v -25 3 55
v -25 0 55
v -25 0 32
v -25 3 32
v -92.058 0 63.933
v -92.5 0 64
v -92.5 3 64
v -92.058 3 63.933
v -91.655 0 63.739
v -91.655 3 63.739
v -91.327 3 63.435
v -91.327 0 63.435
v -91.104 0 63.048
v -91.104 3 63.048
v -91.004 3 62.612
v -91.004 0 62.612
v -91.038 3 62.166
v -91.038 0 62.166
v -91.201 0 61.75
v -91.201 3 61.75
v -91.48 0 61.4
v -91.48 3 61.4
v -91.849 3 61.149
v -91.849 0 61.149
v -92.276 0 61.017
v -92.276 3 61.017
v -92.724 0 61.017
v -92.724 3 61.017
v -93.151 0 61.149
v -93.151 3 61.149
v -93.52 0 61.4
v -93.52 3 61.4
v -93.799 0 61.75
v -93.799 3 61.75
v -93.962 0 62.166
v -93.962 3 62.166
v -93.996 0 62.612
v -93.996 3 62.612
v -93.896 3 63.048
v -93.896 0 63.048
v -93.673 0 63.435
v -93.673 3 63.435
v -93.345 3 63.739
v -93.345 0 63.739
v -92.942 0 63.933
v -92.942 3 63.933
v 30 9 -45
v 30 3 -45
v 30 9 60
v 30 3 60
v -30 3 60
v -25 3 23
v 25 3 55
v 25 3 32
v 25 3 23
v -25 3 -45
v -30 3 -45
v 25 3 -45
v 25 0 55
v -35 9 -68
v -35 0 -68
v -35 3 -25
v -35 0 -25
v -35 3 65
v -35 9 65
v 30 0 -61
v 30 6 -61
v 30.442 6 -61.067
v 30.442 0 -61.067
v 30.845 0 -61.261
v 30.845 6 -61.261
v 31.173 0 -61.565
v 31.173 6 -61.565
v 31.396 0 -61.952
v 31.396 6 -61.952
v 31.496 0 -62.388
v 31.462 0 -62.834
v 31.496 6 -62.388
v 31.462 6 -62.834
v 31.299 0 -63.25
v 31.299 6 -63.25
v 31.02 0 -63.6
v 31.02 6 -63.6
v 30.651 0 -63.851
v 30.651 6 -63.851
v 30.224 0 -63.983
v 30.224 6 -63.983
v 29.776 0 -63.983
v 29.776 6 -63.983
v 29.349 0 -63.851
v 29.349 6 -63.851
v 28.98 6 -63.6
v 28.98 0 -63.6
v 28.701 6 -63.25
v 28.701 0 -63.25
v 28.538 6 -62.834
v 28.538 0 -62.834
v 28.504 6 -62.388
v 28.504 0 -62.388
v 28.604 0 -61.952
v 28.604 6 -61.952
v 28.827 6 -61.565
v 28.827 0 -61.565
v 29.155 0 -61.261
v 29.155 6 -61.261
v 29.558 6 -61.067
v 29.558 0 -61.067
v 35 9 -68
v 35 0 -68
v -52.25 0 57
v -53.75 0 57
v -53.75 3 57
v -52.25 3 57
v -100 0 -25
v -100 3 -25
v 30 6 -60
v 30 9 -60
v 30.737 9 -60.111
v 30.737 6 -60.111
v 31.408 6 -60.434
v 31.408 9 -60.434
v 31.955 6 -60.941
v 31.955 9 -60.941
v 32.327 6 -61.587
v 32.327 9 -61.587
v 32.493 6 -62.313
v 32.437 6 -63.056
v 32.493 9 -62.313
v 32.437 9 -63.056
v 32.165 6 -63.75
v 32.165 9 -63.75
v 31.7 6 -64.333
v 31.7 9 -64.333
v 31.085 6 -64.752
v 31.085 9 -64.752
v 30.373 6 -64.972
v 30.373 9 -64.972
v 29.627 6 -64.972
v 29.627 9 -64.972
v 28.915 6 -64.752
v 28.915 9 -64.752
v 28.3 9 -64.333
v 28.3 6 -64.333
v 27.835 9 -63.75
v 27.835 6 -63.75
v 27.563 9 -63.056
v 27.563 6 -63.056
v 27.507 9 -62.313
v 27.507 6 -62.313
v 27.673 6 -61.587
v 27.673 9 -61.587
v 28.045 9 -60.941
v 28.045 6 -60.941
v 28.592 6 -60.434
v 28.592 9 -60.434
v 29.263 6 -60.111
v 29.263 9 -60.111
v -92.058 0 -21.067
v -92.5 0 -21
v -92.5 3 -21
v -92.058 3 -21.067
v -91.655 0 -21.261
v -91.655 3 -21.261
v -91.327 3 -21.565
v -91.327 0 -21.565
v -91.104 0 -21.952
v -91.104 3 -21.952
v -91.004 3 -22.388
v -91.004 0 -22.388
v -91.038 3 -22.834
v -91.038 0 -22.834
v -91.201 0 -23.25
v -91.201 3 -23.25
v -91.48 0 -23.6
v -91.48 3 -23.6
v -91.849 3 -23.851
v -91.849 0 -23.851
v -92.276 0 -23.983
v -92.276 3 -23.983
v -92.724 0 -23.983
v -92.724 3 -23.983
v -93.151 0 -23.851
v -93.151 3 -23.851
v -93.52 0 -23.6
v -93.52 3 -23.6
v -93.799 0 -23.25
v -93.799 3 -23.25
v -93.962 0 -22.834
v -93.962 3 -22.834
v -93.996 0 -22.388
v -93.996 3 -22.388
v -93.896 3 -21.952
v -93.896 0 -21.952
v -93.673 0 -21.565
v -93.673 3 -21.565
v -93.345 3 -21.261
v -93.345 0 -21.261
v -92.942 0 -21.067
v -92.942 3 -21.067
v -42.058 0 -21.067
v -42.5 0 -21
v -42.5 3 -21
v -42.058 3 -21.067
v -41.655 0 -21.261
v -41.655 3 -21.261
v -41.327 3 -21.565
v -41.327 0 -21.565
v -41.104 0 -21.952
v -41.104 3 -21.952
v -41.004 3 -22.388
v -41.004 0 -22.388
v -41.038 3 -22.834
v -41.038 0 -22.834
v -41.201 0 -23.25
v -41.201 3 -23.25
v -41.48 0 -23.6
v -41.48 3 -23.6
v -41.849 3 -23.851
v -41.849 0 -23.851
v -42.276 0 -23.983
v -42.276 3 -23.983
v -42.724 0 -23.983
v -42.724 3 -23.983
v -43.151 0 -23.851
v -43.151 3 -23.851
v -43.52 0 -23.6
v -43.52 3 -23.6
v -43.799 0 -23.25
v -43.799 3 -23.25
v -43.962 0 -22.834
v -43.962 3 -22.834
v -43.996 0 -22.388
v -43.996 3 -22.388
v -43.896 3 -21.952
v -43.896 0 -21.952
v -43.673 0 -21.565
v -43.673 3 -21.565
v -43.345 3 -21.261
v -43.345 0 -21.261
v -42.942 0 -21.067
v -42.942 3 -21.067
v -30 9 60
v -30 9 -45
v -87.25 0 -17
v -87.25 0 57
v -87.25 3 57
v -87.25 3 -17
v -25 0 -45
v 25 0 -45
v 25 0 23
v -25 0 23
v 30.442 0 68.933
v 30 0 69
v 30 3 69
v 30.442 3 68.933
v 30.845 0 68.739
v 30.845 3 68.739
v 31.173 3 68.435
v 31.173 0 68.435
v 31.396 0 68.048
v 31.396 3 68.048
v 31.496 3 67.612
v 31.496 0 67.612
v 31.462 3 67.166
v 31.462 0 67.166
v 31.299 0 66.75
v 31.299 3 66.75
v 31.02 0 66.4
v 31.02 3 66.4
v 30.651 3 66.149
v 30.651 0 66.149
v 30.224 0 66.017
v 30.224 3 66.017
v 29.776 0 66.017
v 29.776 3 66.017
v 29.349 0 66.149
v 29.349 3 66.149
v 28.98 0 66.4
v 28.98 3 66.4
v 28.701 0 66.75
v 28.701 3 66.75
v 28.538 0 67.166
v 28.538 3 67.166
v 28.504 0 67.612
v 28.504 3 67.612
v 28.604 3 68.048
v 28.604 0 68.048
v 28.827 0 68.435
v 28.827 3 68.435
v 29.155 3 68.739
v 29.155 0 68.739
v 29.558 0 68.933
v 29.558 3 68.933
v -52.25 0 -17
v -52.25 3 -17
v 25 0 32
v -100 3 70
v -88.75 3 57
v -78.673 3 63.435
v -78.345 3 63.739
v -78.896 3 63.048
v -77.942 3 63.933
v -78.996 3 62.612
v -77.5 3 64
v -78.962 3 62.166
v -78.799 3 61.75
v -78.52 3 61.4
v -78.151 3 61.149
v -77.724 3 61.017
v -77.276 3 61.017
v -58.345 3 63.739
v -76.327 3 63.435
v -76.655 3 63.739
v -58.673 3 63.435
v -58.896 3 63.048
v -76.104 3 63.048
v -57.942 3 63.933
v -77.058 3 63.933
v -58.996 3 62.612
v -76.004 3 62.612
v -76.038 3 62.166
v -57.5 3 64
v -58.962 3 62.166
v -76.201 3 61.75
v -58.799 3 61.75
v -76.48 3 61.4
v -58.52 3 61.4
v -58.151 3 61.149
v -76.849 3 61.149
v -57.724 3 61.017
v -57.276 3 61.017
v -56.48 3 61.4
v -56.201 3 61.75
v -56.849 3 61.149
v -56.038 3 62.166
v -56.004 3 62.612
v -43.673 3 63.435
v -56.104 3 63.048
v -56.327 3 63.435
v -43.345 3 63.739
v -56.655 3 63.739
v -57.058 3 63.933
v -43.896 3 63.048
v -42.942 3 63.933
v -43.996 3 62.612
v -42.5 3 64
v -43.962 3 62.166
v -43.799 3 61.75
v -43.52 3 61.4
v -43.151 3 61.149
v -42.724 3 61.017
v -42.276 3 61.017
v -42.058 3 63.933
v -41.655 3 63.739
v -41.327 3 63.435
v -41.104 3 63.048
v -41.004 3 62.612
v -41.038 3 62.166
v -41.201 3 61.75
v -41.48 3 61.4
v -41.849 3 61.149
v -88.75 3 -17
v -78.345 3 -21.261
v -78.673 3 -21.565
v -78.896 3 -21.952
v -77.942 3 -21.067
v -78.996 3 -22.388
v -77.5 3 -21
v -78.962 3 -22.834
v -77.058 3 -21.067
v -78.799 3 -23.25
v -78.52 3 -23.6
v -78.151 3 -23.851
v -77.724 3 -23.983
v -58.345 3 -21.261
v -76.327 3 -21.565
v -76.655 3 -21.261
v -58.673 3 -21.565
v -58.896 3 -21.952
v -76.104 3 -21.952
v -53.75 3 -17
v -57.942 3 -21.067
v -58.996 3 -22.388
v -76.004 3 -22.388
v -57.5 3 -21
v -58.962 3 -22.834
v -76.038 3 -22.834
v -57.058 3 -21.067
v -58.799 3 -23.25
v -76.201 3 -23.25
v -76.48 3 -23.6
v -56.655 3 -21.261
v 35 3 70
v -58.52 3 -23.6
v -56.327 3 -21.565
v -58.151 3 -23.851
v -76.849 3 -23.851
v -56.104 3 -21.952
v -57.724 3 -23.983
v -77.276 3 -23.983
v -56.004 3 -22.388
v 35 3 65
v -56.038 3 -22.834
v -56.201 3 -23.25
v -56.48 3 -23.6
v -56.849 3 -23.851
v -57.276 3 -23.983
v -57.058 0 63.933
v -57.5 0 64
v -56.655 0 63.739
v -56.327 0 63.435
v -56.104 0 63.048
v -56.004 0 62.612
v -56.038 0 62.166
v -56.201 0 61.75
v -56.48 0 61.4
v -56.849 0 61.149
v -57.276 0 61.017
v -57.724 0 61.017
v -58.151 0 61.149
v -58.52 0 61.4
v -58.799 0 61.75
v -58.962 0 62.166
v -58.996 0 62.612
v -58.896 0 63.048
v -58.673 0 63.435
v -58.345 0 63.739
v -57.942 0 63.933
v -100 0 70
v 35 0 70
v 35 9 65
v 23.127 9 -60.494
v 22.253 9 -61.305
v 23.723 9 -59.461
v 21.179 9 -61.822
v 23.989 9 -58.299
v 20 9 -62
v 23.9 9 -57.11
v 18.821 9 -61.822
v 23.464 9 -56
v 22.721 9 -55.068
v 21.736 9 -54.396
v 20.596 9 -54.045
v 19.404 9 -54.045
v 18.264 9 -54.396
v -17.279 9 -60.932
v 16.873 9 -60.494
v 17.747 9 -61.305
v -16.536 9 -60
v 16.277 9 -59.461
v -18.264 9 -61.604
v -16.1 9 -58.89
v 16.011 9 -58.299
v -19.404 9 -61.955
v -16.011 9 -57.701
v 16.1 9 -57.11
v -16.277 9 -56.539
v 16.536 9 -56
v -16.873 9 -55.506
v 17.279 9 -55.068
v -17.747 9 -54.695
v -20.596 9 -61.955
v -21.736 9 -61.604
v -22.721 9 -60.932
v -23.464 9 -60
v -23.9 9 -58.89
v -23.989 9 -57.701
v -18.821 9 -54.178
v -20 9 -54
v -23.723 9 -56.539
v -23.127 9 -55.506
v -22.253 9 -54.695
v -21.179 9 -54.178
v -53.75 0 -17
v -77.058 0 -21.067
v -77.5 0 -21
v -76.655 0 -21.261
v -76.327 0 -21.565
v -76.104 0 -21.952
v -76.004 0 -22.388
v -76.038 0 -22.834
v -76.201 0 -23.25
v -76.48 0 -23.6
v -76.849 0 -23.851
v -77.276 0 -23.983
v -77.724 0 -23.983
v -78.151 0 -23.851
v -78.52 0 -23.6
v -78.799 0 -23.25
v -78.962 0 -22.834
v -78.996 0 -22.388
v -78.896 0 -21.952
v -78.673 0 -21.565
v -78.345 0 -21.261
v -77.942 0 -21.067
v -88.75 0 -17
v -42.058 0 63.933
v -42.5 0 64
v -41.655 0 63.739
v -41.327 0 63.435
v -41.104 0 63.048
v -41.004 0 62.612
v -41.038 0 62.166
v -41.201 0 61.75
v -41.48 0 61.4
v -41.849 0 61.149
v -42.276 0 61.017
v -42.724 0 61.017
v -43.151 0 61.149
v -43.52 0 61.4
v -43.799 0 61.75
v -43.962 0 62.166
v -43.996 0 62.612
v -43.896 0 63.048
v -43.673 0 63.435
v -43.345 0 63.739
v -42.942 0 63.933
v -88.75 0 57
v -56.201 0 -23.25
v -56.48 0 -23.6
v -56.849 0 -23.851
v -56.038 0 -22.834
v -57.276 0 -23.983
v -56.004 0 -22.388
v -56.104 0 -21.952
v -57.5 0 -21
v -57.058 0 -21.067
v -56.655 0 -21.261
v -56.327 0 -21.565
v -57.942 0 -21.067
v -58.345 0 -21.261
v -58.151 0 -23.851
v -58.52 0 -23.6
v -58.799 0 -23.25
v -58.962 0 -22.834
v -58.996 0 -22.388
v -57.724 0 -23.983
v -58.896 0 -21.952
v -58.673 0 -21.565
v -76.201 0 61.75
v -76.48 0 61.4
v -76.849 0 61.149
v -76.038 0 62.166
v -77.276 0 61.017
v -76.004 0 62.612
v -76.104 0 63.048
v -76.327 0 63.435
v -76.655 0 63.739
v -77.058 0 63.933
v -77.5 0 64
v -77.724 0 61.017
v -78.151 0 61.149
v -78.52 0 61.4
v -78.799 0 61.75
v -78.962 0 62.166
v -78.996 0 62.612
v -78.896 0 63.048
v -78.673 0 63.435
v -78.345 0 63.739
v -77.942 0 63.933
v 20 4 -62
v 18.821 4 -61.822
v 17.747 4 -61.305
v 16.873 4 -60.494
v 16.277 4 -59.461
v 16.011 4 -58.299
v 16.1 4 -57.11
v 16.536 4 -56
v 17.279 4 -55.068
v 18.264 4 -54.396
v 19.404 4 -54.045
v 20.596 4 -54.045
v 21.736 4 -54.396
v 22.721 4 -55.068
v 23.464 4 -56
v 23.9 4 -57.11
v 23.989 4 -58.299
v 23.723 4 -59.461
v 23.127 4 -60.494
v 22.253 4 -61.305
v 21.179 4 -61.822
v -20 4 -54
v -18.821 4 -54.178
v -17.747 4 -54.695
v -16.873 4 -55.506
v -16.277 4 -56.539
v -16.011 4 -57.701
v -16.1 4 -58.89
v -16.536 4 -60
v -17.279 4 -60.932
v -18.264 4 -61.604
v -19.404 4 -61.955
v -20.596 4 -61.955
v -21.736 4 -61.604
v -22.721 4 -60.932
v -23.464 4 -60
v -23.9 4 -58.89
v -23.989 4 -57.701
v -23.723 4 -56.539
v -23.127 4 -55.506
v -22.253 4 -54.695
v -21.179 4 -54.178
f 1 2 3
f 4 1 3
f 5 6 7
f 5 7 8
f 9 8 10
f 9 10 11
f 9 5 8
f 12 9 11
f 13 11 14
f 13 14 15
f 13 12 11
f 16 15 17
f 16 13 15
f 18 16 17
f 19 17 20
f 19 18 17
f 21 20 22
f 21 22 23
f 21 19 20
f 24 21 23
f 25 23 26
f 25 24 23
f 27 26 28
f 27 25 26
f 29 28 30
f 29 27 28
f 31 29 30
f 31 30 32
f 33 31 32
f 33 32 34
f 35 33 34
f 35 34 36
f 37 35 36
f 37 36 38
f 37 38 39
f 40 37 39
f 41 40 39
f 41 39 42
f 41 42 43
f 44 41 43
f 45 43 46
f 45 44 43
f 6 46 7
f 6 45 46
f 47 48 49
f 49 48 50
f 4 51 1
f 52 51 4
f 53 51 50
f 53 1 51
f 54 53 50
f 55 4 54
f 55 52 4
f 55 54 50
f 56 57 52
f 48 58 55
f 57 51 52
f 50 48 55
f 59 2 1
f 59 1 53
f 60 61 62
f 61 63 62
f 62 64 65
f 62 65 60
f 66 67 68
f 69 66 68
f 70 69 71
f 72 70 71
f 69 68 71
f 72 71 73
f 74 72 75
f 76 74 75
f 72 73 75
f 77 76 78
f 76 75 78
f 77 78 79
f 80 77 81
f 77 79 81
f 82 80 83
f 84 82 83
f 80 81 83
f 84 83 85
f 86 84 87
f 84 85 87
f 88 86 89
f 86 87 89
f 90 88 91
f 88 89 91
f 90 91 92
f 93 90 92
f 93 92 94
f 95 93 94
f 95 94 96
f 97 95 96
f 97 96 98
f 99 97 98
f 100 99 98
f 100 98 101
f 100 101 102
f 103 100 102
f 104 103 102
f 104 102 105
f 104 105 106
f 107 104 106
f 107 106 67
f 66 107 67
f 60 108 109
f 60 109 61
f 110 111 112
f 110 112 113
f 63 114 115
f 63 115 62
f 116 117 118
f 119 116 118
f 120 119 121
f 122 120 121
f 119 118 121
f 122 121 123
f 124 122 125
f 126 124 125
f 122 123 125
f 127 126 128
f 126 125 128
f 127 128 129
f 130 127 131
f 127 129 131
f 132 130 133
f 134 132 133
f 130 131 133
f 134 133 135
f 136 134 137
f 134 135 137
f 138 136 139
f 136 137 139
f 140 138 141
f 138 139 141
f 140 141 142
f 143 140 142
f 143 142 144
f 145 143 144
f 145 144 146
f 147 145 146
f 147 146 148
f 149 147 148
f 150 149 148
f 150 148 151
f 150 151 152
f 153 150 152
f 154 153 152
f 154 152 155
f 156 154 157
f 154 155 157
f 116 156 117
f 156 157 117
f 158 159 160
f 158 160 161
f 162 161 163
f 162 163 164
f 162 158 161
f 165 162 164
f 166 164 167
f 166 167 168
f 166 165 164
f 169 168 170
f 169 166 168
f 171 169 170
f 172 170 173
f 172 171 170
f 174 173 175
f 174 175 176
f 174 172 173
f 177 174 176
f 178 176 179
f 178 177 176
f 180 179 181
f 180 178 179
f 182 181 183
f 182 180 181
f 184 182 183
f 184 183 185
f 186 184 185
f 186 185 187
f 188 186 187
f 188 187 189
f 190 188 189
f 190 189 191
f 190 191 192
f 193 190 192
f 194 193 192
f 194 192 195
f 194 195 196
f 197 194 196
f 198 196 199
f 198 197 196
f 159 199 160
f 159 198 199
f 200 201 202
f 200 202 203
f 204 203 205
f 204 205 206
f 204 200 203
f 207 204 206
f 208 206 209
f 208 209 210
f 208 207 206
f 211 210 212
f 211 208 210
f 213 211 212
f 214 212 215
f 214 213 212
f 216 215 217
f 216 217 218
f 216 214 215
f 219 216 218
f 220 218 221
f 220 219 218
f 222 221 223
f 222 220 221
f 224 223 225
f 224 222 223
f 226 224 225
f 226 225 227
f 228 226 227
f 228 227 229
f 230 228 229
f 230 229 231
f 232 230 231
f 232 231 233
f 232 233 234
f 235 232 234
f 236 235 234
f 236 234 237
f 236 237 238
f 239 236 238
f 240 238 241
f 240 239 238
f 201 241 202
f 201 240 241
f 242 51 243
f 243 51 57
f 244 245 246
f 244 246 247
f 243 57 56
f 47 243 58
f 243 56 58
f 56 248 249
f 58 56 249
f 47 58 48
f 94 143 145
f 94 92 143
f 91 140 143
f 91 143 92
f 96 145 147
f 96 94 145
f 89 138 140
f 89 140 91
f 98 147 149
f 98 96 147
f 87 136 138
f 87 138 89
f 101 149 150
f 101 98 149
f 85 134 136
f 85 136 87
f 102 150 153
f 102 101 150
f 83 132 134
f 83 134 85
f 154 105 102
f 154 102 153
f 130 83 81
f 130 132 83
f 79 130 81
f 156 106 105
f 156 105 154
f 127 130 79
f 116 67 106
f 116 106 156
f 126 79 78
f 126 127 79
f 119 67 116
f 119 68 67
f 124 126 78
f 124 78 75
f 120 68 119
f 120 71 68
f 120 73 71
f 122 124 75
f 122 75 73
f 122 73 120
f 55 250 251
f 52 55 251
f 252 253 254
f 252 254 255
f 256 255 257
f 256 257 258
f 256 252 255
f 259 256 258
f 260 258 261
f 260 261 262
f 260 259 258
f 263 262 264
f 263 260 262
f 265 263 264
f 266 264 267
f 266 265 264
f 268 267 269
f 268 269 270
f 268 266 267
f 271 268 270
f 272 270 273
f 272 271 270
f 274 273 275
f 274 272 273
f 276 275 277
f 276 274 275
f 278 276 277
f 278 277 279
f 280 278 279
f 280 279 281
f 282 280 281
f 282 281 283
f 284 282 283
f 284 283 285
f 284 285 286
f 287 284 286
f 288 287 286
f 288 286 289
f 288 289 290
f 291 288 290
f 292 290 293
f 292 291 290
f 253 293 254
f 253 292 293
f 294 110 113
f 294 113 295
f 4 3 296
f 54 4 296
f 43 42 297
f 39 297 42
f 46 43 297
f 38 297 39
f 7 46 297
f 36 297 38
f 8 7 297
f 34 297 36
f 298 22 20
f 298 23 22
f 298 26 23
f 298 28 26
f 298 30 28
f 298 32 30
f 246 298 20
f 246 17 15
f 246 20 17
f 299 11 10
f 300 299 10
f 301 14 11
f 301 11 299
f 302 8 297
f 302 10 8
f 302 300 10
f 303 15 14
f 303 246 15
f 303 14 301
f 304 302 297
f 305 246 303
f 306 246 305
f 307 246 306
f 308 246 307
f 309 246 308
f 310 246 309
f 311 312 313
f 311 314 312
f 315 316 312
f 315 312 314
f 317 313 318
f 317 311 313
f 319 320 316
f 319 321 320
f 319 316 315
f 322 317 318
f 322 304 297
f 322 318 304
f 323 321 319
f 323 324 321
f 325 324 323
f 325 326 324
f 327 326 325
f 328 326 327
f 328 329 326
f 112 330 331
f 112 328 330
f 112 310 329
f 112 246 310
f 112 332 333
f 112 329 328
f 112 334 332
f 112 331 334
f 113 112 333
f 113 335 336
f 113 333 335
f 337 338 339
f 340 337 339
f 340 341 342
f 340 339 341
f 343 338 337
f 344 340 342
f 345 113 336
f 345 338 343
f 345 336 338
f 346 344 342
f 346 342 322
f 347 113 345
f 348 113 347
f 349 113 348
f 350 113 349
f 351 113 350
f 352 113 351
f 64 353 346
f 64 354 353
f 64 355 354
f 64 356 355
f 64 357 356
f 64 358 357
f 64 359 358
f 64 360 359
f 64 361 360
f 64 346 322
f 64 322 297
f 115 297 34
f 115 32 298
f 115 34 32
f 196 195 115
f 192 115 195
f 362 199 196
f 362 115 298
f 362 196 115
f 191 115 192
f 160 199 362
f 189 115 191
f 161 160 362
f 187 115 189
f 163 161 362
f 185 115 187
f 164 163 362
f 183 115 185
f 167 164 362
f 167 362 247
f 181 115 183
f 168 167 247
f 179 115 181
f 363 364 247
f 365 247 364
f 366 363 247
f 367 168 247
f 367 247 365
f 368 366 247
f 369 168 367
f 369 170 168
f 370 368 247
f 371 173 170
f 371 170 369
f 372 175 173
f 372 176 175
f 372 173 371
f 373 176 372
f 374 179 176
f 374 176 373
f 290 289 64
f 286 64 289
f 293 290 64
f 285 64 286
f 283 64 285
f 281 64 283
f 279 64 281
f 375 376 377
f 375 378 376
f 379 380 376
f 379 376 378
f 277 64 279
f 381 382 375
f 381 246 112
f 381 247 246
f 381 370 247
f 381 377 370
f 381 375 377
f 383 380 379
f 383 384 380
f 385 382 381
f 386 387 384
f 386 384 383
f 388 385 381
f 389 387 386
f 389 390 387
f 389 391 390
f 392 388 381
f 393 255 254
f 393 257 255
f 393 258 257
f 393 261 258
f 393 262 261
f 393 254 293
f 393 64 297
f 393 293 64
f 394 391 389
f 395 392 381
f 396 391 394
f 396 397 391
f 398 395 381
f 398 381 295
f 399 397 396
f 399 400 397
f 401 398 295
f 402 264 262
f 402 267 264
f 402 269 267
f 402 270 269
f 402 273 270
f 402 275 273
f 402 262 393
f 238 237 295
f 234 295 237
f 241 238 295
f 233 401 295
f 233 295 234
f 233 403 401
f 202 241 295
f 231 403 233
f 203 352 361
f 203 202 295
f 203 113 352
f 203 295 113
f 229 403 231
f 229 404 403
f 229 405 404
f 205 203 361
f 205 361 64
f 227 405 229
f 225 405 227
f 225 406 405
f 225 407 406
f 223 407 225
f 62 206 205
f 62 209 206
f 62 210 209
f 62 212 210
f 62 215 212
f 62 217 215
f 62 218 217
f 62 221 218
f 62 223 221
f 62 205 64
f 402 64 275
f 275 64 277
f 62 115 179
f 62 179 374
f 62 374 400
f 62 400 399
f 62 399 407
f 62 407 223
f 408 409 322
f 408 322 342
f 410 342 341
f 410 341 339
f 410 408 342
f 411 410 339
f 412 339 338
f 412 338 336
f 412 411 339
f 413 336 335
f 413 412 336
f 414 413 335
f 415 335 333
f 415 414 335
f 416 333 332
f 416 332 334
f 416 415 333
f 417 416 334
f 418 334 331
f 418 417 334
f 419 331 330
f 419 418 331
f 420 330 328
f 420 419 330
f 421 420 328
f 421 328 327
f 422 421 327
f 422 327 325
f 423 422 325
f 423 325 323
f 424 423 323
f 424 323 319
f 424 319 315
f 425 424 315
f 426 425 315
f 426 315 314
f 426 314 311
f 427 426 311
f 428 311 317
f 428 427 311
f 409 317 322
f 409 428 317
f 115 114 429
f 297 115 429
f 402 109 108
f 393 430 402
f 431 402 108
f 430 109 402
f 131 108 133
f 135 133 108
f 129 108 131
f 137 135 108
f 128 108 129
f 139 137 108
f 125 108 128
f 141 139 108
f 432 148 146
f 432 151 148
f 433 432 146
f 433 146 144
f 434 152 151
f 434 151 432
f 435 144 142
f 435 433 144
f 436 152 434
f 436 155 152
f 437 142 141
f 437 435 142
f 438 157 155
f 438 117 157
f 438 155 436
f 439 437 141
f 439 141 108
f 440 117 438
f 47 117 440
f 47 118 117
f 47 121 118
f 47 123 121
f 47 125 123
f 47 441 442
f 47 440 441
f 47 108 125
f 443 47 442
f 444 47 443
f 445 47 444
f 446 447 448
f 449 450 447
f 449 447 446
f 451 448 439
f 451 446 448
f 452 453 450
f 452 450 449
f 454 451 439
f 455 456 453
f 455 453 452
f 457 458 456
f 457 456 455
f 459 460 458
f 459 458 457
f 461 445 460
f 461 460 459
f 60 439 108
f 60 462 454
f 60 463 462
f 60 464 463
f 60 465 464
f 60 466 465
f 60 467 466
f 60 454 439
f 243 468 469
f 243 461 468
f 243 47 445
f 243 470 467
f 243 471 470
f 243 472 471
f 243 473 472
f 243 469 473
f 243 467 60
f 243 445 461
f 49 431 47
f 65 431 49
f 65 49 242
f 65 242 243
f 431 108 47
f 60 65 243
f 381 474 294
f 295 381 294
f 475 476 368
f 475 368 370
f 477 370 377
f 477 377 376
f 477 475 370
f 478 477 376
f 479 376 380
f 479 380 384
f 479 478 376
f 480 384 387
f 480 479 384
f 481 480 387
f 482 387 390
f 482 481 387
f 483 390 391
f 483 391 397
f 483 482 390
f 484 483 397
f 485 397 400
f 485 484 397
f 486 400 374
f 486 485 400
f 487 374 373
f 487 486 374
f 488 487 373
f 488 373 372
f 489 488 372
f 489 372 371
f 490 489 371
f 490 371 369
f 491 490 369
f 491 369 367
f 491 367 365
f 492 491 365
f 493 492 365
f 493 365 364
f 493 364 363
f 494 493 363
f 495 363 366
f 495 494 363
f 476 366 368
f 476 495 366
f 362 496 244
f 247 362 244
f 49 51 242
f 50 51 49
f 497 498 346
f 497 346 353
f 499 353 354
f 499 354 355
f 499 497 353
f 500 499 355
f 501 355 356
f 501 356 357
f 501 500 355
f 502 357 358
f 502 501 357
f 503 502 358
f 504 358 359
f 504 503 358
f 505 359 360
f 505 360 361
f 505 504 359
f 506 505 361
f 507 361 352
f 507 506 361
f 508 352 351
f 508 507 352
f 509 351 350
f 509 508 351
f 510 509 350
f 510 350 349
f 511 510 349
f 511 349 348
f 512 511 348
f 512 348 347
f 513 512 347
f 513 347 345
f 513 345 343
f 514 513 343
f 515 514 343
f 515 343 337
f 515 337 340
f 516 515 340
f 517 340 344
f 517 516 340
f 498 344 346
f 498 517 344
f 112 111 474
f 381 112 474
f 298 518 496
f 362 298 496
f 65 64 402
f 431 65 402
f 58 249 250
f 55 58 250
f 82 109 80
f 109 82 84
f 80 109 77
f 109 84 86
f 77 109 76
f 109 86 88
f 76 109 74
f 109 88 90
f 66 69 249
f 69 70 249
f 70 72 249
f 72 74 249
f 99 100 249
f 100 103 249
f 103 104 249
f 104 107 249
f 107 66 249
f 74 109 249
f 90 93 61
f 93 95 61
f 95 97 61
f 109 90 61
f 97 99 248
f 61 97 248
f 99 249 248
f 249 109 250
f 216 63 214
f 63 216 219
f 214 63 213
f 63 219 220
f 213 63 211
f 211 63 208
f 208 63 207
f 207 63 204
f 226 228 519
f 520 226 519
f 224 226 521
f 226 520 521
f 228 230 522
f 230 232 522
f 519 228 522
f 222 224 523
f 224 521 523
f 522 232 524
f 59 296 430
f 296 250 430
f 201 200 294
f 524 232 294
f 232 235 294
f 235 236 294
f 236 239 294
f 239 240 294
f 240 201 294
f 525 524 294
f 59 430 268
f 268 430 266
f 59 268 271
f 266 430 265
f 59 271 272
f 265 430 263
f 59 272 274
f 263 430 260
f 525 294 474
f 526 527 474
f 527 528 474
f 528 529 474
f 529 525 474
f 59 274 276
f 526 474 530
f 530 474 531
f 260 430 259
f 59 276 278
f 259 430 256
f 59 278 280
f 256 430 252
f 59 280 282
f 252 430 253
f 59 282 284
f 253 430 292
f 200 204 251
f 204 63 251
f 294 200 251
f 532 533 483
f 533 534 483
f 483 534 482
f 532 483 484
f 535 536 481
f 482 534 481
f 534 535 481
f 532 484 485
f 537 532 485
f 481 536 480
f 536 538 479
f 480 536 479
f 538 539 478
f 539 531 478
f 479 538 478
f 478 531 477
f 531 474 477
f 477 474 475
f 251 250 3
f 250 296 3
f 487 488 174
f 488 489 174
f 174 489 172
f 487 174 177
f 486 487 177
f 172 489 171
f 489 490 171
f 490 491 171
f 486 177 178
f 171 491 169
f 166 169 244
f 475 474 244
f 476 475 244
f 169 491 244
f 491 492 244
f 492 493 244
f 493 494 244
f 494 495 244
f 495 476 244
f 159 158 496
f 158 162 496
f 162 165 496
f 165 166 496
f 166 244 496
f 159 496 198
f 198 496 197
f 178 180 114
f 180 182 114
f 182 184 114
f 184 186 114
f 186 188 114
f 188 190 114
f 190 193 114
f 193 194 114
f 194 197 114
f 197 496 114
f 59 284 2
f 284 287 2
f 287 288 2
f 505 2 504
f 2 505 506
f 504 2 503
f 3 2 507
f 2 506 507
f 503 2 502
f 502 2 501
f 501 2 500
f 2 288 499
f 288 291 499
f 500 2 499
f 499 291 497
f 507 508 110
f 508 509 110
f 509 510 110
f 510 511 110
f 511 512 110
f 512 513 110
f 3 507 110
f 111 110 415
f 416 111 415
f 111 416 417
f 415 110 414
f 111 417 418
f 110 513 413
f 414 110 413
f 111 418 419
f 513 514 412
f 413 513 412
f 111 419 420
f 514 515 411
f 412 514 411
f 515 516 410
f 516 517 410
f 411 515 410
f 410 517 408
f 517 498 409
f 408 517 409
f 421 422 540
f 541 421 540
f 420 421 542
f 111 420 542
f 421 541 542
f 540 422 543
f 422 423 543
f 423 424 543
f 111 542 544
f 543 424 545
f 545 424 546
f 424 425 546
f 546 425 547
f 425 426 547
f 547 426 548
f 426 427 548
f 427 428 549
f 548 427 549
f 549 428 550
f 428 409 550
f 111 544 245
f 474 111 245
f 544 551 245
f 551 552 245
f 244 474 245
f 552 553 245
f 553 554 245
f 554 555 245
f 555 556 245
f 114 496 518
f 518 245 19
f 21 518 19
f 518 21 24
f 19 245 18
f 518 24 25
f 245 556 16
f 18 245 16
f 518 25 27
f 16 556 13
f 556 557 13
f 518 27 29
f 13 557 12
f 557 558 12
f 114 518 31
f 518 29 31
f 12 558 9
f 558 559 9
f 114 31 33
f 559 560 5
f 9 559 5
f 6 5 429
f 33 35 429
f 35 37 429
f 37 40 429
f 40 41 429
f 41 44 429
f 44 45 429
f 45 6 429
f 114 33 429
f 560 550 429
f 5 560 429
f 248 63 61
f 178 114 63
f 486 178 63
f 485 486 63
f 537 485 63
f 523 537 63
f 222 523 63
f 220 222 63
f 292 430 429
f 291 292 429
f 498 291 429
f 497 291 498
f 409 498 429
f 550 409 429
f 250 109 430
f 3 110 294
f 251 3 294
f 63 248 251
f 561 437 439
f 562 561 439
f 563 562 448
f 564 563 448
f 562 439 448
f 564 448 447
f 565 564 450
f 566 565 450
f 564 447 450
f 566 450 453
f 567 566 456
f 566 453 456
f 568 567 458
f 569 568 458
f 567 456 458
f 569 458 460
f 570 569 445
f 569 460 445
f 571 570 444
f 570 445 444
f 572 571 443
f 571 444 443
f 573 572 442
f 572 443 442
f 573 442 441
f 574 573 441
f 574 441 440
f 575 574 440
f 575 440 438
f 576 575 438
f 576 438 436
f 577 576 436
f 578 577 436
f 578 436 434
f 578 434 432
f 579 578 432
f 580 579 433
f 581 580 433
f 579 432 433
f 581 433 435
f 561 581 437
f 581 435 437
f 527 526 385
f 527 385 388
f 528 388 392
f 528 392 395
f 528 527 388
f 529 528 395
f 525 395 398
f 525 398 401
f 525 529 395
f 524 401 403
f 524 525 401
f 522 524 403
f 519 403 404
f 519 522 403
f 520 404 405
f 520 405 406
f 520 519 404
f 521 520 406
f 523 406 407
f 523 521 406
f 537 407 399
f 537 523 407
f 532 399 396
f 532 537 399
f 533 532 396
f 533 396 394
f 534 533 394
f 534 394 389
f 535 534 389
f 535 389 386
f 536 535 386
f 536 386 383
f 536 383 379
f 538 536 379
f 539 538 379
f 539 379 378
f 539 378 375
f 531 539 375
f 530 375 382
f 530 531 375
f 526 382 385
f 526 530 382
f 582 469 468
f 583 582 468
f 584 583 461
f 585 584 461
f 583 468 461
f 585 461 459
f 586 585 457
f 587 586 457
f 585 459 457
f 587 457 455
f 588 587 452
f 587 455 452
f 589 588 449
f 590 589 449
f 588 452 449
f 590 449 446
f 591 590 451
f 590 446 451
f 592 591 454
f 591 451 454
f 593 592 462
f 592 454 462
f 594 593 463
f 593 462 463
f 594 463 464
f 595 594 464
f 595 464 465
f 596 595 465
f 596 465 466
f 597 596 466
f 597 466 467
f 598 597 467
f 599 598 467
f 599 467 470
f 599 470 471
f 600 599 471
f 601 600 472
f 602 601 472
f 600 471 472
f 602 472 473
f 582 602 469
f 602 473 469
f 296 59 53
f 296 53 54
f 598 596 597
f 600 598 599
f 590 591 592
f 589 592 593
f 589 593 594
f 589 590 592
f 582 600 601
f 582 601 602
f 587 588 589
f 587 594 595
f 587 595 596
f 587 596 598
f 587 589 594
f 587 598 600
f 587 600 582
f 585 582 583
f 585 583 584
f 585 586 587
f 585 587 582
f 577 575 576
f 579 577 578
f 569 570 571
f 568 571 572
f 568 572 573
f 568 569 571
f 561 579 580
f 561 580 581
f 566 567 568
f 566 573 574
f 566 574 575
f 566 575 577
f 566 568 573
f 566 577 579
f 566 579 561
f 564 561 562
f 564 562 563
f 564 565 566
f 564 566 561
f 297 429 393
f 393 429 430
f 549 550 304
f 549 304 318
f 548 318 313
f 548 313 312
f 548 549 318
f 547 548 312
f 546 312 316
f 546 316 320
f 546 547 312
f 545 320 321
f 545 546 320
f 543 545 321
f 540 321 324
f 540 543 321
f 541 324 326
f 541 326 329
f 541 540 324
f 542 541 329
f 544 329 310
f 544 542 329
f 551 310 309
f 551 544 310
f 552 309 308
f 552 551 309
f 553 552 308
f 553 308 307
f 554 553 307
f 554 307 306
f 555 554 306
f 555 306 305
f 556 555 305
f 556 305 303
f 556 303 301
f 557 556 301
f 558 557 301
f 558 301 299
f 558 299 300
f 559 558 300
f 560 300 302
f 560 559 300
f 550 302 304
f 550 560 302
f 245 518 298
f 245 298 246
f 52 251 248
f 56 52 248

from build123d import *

# Parameters (mm, degrees)
SKETCH1_W           = 70
SKETCH1_H           = 130
SKETCH1_W_2         = 60
SKETCH1_H_2         = 105
BOSS_EXTRUDE1_DEPTH = 9
SKETCH1_3_W         = 50
SKETCH1_3_H         = 23
SKETCH1_3_W_2       = 65
SKETCH1_3_H_2       = 90
SKETCH1_3_R         = 1.5
SKETCH1_3_W_3       = 1.5
SKETCH1_3_H_3       = 74
SKETCH1_3_W_4       = 5
SKETCH1_3_H_4       = 10
BOSS_EXTRUDE2_DEPTH = 3
SKETCH2_R           = 1.5
BOSS_EXTRUDE3_DEPTH = 3
SKETCH3_R           = 4
CUT_EXTRUDE1_DEPTH  = 5
SKETCH3_3_R         = 1.5
CUT_EXTRUDE2_DEPTH  = 20
SKETCH4_W           = 70
SKETCH4_H           = 9
BOSS_EXTRUDE4_DEPTH = 3
SKETCH3_6_R         = 1.5
CUT_EXTRUDE5_DEPTH  = 3


with BuildPart() as part:
    # Sketch1 → Boss-Extrude1 (new body)
    with BuildSketch(Plane(origin=(0, 0, 0), x_dir=(1, 0, 0), z_dir=(0, 1, 0))):
        Rectangle(SKETCH1_W, SKETCH1_H)
        with Locations((0, -7.5)):
            Rectangle(SKETCH1_W_2, SKETCH1_H_2, mode=Mode.SUBTRACT)
    extrude(amount=BOSS_EXTRUDE1_DEPTH)

    # Sketch1<3> → Boss-Extrude2 (add)
    # profile 1 of 3: a face of its own
    with BuildSketch(Plane(origin=(0, 0, 0), x_dir=(1, 0, 0), z_dir=(0, 1, 0))):
        Polygon((-30, 45), (-30, -60), (30, -60), (30, 45), (25, 45), (25, -23), (-25, -23), (-25, 45), align=None)
        with Locations((0, -43.5)):
            Rectangle(SKETCH1_3_W, SKETCH1_3_H, mode=Mode.SUBTRACT)
    # profile 2 of 3: a face of its own
    with BuildSketch(Plane(origin=(0, 0, 0), x_dir=(1, 0, 0), z_dir=(0, 1, 0))):
        with Locations((-67.5, -20)):
            Rectangle(SKETCH1_3_W_2, SKETCH1_3_H_2)
        with Locations((-42.5, 22.5)):
            Circle(SKETCH1_3_R, mode=Mode.SUBTRACT)
        with Locations((-57.5, -62.5)):
            Circle(SKETCH1_3_R, mode=Mode.SUBTRACT)
        with Locations((-42.5, -62.5)):
            Circle(SKETCH1_3_R, mode=Mode.SUBTRACT)
        with Locations((-53, -20)):
            Rectangle(SKETCH1_3_W_3, SKETCH1_3_H_3, mode=Mode.SUBTRACT)
        with Locations((-57.5, 22.5)):
            Circle(SKETCH1_3_R, mode=Mode.SUBTRACT)
        with Locations((-77.5, 22.5)):
            Circle(SKETCH1_3_R, mode=Mode.SUBTRACT)
        with Locations((-92.5, -62.5)):
            Circle(SKETCH1_3_R, mode=Mode.SUBTRACT)
        with Locations((-77.5, -62.5)):
            Circle(SKETCH1_3_R, mode=Mode.SUBTRACT)
        with Locations((-88, -20)):
            Rectangle(SKETCH1_3_W_3, SKETCH1_3_H_3, mode=Mode.SUBTRACT)
        with Locations((-92.5, 22.5)):
            Circle(SKETCH1_3_R, mode=Mode.SUBTRACT)
    # profile 3 of 3: a face of its own
    with BuildSketch(Plane(origin=(0, 0, 0), x_dir=(1, 0, 0), z_dir=(0, 1, 0))):
        with Locations((27.5, 60)):
            Rectangle(SKETCH1_3_W_4, SKETCH1_3_H_4)
    extrude(amount=BOSS_EXTRUDE2_DEPTH)

    # Sketch2 → Boss-Extrude3 (add)
    with BuildSketch(Plane(origin=(0, 0, 0), x_dir=(1, 0, 0), z_dir=(0, 1, 0))):
        Polygon((35, -65), (-35, -65), (-100, -65), (-100, -70), (35, -70), align=None)
        with Locations((30, -67.5)):
            Circle(SKETCH2_R, mode=Mode.SUBTRACT)
    extrude(amount=BOSS_EXTRUDE3_DEPTH)

    # Sketch3 → Cut-Extrude1 (cut)
    with BuildSketch(Plane(origin=(0, 9, 0), x_dir=(1, 0, 0), z_dir=(0, 1, 0))):
        with Locations((-20, 58)):
            Circle(SKETCH3_R)
        with Locations((20, 58)):
            Circle(SKETCH3_R)
    extrude(amount=-CUT_EXTRUDE1_DEPTH, mode=Mode.SUBTRACT)

    # Sketch3<3> → Cut-Extrude2 (cut)
    with BuildSketch(Plane(origin=(0, 9, 0), x_dir=(1, 0, 0), z_dir=(0, 1, 0))):
        with Locations((30, 62.5)):
            Circle(SKETCH3_3_R)
    extrude(amount=-CUT_EXTRUDE2_DEPTH, mode=Mode.SUBTRACT)

    # Sketch4 → Boss-Extrude4 (add)
    with BuildSketch(Plane(origin=(0, 0, -65), x_dir=(-1, 0, 0), z_dir=(0, 0, -1))):
        with Locations((0, 4.5)):
            Rectangle(SKETCH4_W, SKETCH4_H)
    extrude(amount=BOSS_EXTRUDE4_DEPTH)

    # Sketch3<6> → Cut-Extrude5 (cut)
    with BuildSketch(Plane(origin=(0, 9, 0), x_dir=(1, 0, 0), z_dir=(0, 1, 0))):
        with BuildLine():
            ThreePointArc((32.5, 62.5), (31.767766969, 64.267766937), (30.000000046, 65))
            ThreePointArc((30.000000046, 65), (27.5, 62.500000023), (30, 60))
            ThreePointArc((30, 60), (31.767766953, 60.732233047), (32.5, 62.5))
        make_face()
        with Locations((30, 62.5)):
            Circle(SKETCH3_6_R, mode=Mode.SUBTRACT)
    extrude(amount=-CUT_EXTRUDE5_DEPTH, mode=Mode.SUBTRACT)


solid = part.part
